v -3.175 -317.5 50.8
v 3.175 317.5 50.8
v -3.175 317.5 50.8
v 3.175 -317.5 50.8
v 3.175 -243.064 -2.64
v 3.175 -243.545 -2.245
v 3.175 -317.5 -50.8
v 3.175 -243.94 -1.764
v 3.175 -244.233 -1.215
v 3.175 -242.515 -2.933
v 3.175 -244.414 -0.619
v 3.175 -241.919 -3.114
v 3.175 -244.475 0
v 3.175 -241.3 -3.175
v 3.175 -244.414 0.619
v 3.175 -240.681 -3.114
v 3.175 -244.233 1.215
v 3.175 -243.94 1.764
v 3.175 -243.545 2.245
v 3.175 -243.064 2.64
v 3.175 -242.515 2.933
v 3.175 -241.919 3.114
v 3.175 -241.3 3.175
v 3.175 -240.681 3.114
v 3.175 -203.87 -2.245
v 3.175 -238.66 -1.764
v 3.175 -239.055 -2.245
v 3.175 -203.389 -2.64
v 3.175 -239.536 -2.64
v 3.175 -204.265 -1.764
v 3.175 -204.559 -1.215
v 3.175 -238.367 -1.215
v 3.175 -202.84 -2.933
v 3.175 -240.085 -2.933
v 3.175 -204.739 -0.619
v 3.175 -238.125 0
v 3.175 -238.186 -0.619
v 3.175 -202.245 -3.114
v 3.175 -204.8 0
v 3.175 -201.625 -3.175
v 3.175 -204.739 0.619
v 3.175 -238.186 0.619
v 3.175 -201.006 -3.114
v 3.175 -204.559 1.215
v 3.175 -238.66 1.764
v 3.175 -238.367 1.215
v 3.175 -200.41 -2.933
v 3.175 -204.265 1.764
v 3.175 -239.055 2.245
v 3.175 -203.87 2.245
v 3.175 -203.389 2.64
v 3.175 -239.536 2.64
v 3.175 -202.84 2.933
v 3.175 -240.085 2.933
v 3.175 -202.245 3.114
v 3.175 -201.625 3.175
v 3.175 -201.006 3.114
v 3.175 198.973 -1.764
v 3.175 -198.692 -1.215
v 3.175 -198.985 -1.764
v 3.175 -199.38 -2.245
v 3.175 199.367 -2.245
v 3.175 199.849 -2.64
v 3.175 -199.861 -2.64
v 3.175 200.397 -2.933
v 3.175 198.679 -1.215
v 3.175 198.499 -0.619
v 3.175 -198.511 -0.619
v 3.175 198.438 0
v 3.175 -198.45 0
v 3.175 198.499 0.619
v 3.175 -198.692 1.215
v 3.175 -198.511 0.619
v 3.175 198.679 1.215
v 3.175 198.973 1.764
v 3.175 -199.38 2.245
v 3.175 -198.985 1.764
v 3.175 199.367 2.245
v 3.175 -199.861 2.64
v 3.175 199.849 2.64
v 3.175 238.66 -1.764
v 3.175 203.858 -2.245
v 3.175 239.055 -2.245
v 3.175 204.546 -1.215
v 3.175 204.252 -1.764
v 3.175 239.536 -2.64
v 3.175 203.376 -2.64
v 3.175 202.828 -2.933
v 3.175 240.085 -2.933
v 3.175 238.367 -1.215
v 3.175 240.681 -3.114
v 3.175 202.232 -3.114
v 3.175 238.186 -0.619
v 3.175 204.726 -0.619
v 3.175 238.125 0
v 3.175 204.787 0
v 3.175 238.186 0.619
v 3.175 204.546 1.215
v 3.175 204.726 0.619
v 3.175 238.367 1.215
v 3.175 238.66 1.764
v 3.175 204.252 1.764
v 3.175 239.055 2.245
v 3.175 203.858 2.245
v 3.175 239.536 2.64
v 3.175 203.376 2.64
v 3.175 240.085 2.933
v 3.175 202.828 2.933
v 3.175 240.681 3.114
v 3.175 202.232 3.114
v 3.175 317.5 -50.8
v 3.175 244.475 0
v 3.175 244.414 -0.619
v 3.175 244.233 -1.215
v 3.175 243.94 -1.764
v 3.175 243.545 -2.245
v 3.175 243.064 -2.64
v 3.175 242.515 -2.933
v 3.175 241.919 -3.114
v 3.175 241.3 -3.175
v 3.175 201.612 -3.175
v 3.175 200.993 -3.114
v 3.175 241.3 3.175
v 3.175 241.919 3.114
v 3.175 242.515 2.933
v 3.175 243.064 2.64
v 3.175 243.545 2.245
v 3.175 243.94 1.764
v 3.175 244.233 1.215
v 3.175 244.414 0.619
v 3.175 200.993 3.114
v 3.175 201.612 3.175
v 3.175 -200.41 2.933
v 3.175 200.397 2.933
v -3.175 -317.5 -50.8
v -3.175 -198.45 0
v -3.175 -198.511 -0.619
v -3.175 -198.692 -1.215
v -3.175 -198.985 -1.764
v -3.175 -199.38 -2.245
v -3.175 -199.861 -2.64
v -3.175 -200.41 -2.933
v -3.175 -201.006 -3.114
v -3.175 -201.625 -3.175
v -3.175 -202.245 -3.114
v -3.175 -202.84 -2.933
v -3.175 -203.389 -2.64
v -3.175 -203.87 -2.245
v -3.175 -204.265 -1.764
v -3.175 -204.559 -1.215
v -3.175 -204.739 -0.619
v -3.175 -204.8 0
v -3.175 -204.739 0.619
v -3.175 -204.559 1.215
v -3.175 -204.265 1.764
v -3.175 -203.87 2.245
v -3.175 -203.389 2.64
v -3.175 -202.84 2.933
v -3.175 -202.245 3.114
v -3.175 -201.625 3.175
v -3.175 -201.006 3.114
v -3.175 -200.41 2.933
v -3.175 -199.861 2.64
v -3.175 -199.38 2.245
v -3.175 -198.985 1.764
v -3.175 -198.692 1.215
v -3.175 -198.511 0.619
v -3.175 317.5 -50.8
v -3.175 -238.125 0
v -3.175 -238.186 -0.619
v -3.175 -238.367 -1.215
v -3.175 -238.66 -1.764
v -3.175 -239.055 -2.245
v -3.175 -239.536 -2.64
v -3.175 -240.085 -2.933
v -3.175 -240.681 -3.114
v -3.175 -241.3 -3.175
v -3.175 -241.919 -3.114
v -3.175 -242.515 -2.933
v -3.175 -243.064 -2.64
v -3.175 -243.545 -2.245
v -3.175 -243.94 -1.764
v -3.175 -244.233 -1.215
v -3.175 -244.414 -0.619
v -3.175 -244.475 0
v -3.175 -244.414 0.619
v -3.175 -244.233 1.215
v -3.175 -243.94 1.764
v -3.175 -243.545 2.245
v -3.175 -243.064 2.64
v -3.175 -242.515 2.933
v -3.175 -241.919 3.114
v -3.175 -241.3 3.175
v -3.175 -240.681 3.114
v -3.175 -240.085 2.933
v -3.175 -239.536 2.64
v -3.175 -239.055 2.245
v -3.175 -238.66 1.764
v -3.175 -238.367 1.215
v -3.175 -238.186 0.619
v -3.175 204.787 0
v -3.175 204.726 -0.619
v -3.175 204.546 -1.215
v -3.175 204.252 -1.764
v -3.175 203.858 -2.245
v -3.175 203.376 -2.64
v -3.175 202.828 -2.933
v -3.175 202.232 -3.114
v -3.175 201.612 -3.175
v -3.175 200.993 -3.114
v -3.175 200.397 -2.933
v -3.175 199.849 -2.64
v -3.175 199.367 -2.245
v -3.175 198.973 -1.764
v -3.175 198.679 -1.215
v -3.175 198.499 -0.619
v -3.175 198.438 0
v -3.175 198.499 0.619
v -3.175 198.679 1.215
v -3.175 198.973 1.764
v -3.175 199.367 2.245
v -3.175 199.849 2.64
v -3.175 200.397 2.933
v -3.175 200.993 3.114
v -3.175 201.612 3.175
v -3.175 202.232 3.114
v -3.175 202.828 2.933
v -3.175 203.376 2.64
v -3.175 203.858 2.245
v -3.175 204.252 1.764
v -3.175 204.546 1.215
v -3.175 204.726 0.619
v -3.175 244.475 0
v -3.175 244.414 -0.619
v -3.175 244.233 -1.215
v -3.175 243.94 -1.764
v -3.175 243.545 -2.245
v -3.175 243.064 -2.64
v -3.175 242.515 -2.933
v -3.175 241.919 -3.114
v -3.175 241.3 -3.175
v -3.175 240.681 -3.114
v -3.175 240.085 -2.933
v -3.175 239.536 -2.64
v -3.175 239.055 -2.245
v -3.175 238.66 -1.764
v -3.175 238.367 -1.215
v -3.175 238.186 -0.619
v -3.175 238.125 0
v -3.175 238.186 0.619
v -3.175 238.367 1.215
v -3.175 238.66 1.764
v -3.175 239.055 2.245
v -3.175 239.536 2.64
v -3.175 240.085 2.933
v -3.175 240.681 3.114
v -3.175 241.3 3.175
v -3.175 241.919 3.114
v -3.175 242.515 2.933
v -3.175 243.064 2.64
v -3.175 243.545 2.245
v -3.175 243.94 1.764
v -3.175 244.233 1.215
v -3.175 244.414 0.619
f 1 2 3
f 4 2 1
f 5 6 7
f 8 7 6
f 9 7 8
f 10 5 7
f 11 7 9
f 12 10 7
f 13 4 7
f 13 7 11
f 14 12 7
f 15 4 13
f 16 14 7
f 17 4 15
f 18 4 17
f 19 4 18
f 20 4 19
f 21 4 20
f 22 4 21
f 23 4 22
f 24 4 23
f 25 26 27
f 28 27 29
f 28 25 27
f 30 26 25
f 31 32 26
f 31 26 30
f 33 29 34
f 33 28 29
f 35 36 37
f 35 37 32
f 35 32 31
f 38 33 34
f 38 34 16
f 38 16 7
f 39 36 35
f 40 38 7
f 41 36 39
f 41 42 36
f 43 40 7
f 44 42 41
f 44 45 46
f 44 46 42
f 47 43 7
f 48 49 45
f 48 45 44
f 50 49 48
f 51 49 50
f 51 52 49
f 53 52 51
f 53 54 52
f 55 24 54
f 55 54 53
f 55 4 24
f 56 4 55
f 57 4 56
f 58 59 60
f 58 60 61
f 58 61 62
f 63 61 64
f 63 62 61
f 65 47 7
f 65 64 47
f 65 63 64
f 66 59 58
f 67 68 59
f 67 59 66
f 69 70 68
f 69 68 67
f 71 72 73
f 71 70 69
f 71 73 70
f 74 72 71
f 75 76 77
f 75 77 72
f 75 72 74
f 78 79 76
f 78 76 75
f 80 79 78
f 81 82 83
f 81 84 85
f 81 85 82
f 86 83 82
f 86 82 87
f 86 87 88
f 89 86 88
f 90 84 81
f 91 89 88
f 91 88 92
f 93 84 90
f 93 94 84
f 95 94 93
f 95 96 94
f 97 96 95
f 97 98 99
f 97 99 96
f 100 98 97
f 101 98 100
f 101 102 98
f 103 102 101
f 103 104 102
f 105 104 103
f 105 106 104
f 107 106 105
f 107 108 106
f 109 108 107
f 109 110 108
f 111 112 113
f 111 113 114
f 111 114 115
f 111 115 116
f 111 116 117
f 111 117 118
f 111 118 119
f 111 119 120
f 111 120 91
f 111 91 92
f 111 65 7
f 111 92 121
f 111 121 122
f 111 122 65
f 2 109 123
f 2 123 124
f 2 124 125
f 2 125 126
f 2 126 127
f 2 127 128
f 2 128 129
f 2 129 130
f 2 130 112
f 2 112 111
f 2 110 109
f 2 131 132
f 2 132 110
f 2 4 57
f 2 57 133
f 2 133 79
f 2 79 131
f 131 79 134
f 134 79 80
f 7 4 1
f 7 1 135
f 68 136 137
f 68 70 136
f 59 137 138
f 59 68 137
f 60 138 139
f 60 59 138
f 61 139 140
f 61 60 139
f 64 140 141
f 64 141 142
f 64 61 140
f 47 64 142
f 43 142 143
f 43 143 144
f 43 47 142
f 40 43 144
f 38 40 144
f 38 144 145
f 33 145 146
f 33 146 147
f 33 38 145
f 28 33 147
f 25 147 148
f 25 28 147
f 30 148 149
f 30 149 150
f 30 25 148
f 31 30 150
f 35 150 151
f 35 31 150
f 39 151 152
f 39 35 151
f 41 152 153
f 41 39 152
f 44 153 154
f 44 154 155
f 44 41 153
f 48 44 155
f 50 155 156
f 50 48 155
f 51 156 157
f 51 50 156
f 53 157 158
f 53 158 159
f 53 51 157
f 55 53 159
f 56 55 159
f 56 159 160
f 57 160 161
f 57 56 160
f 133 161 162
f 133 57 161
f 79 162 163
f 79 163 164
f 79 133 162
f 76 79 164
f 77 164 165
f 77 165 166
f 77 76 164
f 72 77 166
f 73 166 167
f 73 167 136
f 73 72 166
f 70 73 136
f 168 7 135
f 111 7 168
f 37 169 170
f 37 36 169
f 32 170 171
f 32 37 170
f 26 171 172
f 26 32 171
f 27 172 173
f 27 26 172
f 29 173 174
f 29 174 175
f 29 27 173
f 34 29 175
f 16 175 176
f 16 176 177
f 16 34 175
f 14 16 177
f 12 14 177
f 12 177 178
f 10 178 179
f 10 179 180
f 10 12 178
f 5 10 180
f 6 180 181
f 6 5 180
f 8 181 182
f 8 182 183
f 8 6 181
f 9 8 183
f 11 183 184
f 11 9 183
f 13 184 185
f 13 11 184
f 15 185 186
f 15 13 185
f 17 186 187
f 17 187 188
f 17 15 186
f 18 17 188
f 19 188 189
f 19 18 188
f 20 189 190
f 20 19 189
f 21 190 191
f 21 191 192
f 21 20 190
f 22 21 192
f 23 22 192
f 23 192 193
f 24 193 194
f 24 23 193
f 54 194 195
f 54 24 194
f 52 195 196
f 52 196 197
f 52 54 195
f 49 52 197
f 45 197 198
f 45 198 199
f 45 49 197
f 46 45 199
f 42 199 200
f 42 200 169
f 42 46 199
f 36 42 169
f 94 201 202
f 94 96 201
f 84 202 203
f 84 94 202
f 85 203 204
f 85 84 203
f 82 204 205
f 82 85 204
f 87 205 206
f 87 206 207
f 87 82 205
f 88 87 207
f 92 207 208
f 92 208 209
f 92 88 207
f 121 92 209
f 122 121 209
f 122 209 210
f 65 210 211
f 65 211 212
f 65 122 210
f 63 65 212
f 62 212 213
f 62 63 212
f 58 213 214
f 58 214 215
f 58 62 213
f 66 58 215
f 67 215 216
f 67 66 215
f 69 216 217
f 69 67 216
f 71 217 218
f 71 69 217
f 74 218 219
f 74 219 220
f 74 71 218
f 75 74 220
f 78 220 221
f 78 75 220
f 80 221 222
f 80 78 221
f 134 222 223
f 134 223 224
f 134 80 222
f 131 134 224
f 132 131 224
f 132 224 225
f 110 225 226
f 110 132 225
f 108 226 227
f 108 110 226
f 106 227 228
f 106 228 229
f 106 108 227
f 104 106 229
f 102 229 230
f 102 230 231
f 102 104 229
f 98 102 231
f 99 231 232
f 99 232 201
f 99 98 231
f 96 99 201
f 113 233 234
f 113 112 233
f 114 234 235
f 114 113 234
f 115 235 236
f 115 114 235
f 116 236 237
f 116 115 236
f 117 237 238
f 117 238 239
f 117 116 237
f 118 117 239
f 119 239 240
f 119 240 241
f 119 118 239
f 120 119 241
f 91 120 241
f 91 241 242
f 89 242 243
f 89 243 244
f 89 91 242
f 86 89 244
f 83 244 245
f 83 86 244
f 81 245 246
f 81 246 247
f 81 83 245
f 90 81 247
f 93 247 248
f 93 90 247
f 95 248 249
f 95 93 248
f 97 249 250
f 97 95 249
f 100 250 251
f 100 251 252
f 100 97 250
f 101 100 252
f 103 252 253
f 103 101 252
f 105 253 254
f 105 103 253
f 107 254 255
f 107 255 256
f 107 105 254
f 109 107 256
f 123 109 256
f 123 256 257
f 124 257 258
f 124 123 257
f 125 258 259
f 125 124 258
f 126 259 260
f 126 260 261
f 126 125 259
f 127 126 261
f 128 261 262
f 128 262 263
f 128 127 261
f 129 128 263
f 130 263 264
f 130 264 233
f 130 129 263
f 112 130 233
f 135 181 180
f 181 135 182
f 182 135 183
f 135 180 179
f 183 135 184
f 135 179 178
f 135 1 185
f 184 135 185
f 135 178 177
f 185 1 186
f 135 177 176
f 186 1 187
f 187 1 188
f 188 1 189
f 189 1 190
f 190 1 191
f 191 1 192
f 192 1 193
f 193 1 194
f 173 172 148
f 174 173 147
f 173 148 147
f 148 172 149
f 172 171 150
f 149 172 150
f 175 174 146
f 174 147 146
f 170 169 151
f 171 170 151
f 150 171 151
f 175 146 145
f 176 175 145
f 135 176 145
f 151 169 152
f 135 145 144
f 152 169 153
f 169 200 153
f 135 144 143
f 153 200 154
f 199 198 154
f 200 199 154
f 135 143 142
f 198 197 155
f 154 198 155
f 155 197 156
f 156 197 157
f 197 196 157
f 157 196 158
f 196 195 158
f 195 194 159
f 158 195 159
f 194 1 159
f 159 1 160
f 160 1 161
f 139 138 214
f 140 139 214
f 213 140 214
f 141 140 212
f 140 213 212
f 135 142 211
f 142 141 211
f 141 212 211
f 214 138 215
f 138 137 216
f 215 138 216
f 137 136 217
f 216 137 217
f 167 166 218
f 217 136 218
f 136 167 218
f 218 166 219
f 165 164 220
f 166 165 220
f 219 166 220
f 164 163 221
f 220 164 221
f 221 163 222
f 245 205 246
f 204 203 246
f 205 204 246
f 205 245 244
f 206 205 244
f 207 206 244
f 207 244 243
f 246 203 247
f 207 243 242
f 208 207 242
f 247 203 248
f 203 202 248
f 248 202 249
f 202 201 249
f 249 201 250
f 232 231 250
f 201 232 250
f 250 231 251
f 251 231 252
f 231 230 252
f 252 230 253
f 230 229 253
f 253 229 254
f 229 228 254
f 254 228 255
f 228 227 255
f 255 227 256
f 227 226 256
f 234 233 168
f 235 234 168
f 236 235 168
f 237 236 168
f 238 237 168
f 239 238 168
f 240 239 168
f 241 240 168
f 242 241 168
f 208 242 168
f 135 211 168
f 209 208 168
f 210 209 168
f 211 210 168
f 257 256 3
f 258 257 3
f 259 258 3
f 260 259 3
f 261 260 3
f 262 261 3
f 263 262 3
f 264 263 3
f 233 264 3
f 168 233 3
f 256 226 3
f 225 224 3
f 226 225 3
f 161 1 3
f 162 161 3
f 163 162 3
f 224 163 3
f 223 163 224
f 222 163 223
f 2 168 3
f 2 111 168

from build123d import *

# Parameters (mm, degrees)
F1_DEPTH = 3.175


with BuildPart() as f1:
    # F0 (on Right) → F1 (new body, symmetric)
    with BuildSketch(Plane.YZ):
        with BuildLine():
            Line((317.5, 0), (317.5, 50.8))
            Line((317.5, 50.8), (-317.5, 50.8))
            Line((-317.5, 50.8), (-317.5, 0))
            Line((-317.5, 0), (-244.475, 0))
            ThreePointArc((-244.475, 0), (-241.3, 3.175), (-238.125, 0))
            Line((-238.125, 0), (-204.8002, 0))
            ThreePointArc((-204.8002, 0), (-201.6252, 3.175), (-198.4502, 0))
            Line((-198.4502, 0), (0, 0))
            Line((0, 0), (198.4375, 0))
            ThreePointArc((198.4375, 0), (201.6125, 3.175), (204.7875, 0))
            Line((204.7875, 0), (238.125, 0))
            ThreePointArc((238.125, 0), (241.3, 3.175), (244.475, 0))
            Line((244.475, 0), (317.5, 0))
        make_face()
        with BuildLine():
            Line((317.5, -50.8), (317.5, 0))
            Line((317.5, 0), (244.475, 0))
            ThreePointArc((244.475, 0), (241.3, -3.175), (238.125, 0))
            Line((238.125, 0), (204.7875, 0))
            ThreePointArc((204.7875, 0), (201.6125, -3.175), (198.4375, 0))
            Line((198.4375, 0), (0, 0))
            Line((0, 0), (-198.4502, 0))
            ThreePointArc((-198.4502, 0), (-201.6252, -3.175), (-204.8002, 0))
            Line((-204.8002, 0), (-238.125, 0))
            ThreePointArc((-238.125, 0), (-241.3, -3.175), (-244.475, 0))
            Line((-244.475, 0), (-317.5, 0))
            Line((-317.5, 0), (-317.5, -50.8))
            Line((-317.5, -50.8), (317.5, -50.8))
        make_face()
    extrude(amount=F1_DEPTH, both=True)


solid = f1.part
